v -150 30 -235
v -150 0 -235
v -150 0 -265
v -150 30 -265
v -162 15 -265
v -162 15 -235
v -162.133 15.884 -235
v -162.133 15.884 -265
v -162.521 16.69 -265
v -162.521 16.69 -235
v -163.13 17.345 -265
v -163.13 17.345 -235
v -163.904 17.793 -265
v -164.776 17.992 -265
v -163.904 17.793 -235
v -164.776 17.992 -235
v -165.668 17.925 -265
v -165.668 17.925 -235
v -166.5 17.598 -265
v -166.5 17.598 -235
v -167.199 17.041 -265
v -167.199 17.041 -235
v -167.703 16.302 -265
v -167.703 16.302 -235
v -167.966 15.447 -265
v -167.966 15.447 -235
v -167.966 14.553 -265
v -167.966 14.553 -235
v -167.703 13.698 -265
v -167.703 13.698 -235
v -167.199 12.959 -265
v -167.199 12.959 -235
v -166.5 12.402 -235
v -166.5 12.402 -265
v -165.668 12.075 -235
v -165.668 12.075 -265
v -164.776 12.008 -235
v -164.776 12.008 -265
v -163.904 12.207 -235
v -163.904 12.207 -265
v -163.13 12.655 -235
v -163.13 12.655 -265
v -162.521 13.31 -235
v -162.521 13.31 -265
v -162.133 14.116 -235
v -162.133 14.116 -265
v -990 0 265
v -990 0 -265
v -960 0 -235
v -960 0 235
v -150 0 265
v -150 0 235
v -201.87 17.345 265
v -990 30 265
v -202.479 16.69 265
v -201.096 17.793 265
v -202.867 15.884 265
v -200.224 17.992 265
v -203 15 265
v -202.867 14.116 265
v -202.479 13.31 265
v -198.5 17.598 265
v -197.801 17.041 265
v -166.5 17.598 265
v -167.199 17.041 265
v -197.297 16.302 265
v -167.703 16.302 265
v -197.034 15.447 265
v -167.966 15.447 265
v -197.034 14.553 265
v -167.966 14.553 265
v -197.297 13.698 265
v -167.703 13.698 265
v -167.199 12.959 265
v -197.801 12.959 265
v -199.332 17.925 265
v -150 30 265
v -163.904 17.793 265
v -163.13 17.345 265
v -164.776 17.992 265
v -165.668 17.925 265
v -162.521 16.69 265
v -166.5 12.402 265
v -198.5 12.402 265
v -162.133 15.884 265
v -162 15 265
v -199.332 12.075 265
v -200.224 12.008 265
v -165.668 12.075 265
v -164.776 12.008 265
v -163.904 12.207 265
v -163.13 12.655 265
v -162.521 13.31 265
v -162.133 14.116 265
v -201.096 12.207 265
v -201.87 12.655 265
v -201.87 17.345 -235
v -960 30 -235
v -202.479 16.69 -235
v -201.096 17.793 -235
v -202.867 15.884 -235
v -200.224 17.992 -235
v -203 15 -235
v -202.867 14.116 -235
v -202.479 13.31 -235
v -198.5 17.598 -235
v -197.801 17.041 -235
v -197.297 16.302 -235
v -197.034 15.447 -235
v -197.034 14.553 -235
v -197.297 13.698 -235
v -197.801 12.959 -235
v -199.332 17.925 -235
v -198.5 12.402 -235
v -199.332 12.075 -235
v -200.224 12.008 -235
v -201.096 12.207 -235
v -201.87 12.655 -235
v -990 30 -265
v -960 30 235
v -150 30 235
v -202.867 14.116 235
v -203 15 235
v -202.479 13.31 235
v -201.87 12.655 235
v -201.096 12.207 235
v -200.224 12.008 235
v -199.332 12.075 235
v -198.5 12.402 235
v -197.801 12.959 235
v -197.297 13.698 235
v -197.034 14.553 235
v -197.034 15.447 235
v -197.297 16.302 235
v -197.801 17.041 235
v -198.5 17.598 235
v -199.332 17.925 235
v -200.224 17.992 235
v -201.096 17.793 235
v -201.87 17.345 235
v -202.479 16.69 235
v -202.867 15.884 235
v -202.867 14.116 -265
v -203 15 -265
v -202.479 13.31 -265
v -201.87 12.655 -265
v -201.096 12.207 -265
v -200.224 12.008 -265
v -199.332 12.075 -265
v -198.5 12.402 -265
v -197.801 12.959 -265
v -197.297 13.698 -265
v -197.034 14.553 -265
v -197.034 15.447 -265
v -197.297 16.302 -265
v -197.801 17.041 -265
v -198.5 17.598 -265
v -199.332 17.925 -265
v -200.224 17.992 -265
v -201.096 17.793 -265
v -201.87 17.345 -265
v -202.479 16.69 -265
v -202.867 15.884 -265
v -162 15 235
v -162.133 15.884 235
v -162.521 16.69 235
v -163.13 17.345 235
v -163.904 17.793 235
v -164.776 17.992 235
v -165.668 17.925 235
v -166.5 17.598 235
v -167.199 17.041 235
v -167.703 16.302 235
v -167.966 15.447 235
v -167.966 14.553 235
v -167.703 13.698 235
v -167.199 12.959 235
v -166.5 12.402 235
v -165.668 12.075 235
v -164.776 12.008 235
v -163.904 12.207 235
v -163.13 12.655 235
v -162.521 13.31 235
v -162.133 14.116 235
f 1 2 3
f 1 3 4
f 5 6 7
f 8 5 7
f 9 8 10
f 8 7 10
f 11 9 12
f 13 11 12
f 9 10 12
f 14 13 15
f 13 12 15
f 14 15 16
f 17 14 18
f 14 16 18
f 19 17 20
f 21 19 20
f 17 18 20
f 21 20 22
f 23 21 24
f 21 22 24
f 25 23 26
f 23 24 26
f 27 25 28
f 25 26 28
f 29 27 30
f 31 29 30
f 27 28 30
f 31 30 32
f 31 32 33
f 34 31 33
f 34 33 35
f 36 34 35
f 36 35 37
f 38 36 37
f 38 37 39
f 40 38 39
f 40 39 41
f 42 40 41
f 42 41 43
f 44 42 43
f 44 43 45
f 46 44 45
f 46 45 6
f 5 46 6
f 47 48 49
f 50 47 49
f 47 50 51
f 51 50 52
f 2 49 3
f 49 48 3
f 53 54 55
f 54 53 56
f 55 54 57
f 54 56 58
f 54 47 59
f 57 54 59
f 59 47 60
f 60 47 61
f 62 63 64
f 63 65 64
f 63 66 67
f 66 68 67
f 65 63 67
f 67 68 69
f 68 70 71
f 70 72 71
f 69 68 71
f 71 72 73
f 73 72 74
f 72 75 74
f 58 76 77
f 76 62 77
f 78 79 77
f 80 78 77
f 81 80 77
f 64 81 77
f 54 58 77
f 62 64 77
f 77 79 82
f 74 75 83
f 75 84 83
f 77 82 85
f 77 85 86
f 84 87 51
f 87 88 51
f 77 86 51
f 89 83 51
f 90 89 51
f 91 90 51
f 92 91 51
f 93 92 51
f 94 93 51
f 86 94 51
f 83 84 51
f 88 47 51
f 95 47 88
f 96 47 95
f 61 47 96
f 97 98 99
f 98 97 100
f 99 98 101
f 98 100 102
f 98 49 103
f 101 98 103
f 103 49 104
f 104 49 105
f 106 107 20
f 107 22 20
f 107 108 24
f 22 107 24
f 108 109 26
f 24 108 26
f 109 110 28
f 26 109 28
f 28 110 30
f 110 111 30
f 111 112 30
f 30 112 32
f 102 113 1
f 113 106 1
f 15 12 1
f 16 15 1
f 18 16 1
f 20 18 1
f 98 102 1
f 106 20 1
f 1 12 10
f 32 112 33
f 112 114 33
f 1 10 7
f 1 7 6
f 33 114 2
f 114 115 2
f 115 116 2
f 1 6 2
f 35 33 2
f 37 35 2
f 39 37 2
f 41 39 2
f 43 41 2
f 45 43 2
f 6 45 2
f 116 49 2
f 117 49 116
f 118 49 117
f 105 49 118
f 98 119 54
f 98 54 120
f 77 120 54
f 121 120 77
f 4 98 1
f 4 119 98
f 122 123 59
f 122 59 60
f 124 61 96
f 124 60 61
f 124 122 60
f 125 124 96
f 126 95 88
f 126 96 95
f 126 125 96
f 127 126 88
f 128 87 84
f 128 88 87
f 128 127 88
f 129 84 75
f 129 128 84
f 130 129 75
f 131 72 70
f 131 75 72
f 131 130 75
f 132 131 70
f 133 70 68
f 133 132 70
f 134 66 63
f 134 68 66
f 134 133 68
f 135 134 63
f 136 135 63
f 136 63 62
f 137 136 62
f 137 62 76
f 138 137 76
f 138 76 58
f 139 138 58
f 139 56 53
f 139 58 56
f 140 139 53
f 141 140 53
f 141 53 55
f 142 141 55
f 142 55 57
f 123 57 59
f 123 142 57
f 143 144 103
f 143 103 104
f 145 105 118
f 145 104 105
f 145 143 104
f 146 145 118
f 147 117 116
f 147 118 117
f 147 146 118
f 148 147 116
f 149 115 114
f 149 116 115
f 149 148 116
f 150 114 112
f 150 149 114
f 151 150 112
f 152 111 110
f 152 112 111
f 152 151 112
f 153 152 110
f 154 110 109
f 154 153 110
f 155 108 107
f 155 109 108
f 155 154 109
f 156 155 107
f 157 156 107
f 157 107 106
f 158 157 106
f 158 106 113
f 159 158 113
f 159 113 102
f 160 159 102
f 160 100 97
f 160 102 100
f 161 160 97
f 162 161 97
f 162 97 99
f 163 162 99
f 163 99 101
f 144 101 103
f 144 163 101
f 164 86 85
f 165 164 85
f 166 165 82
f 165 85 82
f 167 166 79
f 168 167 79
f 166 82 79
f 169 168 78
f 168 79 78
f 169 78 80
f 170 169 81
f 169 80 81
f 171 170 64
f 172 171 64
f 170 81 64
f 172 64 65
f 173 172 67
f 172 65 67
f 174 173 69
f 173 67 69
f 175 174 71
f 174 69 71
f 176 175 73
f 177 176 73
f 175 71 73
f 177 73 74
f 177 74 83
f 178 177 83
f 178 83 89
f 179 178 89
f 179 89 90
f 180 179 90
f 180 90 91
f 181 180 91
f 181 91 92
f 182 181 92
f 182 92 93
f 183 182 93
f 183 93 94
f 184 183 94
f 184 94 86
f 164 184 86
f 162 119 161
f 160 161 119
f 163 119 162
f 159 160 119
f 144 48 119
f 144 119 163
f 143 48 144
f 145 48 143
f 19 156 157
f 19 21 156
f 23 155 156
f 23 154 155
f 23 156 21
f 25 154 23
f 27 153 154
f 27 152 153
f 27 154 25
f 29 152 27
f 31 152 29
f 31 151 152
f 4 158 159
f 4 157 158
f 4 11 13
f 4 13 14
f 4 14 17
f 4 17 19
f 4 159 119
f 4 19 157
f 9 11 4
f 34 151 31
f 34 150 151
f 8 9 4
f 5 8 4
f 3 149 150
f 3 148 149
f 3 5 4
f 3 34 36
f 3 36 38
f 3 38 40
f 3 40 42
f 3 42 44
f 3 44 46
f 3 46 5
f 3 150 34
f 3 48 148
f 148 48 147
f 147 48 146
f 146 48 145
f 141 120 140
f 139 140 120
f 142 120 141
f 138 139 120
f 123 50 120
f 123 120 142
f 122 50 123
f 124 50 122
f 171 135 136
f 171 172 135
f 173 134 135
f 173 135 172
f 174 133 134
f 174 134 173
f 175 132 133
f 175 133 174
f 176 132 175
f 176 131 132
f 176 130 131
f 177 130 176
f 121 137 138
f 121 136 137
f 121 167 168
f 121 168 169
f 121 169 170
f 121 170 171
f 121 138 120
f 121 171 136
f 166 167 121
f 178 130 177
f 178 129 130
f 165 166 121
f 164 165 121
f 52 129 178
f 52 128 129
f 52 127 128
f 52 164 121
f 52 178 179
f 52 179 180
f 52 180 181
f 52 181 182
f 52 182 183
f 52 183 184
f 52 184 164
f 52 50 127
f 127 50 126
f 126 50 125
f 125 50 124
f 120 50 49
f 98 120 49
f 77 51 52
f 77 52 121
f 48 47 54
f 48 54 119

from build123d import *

# Parameters (mm, degrees)
SKETCH_1_W               = 1980
SKETCH_1_H               = 530
SKETCH_1_W_2             = 1920
SKETCH_1_H_2             = 470
EXTRUDE_1_DEPTH          = 30
SKETCH_2_W               = 68
SKETCH_2_H               = 30
EXTRUDE_2_DEPTH          = 68
SKETCH_3_R               = 23.5
CUT_EXTRUDE_1_DEPTH      = 1125.999555555
SKETCH_4_W               = 31
SKETCH_4_H               = 470
EXTRUDE_3_DEPTH          = 30
SKETCH_5_R               = 3
CUT_EXTRUDE_2_DEPTH      = 1030.528532873
SKETCH_6_R               = 3
CUT_EXTRUDE_3_DEPTH      = 1030.528532873
SKETCH_7_W               = 1260.245327066
SKETCH_7_H               = 30
CUT_EXTRUDE_4_DEPTH      = 1125.999555555
CUT_EXTRUDE_5_DEPTH      = 1124.343224487
CUT_EXTRUDE_5_DEPTH_BACK = 1124.343224487
SKETCH_8_R               = 3
SKETCH_9_R               = 3
CUT_EXTRUDE_6_DEPTH      = 1124.343224487


with BuildPart() as part:
    # 草图1 → 凸台-拉伸1 (new body)
    with BuildSketch(Plane(origin=(0, 0, 0), x_dir=(1, 0, 0), z_dir=(0, 1, 0))):
        Rectangle(SKETCH_1_W, SKETCH_1_H)
        Rectangle(SKETCH_1_W_2, SKETCH_1_H_2, mode=Mode.SUBTRACT)
    extrude(amount=EXTRUDE_1_DEPTH)

    # 草图2 → 凸台-拉伸2 (add)
    with BuildSketch(Plane.XZ):
        with Locations((0, 250)):
            Rectangle(SKETCH_2_W, SKETCH_2_H)
        with Locations((0, -250)):
            Rectangle(SKETCH_2_W, SKETCH_2_H)
    extrude(amount=EXTRUDE_2_DEPTH)

    # 草图3 → 切除-拉伸1 (cut, through all)
    with BuildSketch(Plane.XY.offset(265)):
        with Locations((0, -30)):
            Circle(SKETCH_3_R)
    extrude(amount=-CUT_EXTRUDE_1_DEPTH, mode=Mode.SUBTRACT)

    # 草图4 → 凸台-拉伸3 (add)
    with BuildSketch(Plane(origin=(0, 30, 0), x_dir=(1, 0, 0), z_dir=(0, 1, 0))):
        with Locations((764.5, 0)):
            Rectangle(SKETCH_4_W, SKETCH_4_H)
    extrude(amount=-EXTRUDE_3_DEPTH)

    # 草图5 → 切除-拉伸2 (cut, through all)
    with BuildSketch(Plane(origin=(0, 30, 0), x_dir=(1, 0, 0), z_dir=(0, 1, 0))):
        with Locations(Location((759, 180, 0), (0, 0, 270))):
            Circle(SKETCH_5_R)
        with Locations(Location((774.5, 180, 0), (0, 0, 270))):
            Circle(SKETCH_5_R)
        with Locations(Location((759, -180, 0), (0, 0, 270))):
            Circle(SKETCH_5_R)
        with Locations(Location((774.5, -180, 0), (0, 0, 270))):
            Circle(SKETCH_5_R)
    extrude(amount=-CUT_EXTRUDE_2_DEPTH, mode=Mode.SUBTRACT)

    # 草图6 → 切除-拉伸3 (cut, symmetric)
    with BuildSketch(Plane(origin=(0, 30, 0), x_dir=(1, 0, 0), z_dir=(0, 1, 0))):
        with Locations(Location((840, -250, 0), (0, 0, 270))):
            Circle(SKETCH_6_R)
    cut_extrude_3 = extrude(amount=CUT_EXTRUDE_3_DEPTH, both=True, mode=Mode.SUBTRACT)

    # 镜向1: 切除-拉伸3 across plane
    add(cut_extrude_3.mirror(Plane.XY), mode=Mode.SUBTRACT)

    # 草图7 → 切除-拉伸4 (cut, through all)
    with BuildSketch(Plane.XY.offset(265)):
        with Locations((480.122663533, 15)):
            Rectangle(SKETCH_7_W, SKETCH_7_H)
    extrude(amount=-CUT_EXTRUDE_4_DEPTH, mode=Mode.SUBTRACT)


with BuildPart() as body_2:
    # of the pieces the cut leaves, the one that is kept (cut_extrude_4_keep)
    add(part.part.solids().sort_by_distance((-990, 0, -265))[0])

    # 草图8 → 切除-拉伸5 (cut, two sides: drawn at the far end of the back side and taken through both)
    with BuildSketch(Plane.XY.offset(265).offset(-CUT_EXTRUDE_5_DEPTH_BACK)):
        with Locations(Location((-200, 15, 0), (0, 0, 180))):
            Circle(SKETCH_8_R)
    extrude(amount=CUT_EXTRUDE_5_DEPTH + CUT_EXTRUDE_5_DEPTH_BACK, mode=Mode.SUBTRACT)

    # 草图9 → 切除-拉伸6 (cut, through all)
    with BuildSketch(Plane.XY.offset(265)):
        with Locations((-165, 15)):
            Circle(SKETCH_9_R)
    extrude(amount=-CUT_EXTRUDE_6_DEPTH, mode=Mode.SUBTRACT)


solid = body_2.part
